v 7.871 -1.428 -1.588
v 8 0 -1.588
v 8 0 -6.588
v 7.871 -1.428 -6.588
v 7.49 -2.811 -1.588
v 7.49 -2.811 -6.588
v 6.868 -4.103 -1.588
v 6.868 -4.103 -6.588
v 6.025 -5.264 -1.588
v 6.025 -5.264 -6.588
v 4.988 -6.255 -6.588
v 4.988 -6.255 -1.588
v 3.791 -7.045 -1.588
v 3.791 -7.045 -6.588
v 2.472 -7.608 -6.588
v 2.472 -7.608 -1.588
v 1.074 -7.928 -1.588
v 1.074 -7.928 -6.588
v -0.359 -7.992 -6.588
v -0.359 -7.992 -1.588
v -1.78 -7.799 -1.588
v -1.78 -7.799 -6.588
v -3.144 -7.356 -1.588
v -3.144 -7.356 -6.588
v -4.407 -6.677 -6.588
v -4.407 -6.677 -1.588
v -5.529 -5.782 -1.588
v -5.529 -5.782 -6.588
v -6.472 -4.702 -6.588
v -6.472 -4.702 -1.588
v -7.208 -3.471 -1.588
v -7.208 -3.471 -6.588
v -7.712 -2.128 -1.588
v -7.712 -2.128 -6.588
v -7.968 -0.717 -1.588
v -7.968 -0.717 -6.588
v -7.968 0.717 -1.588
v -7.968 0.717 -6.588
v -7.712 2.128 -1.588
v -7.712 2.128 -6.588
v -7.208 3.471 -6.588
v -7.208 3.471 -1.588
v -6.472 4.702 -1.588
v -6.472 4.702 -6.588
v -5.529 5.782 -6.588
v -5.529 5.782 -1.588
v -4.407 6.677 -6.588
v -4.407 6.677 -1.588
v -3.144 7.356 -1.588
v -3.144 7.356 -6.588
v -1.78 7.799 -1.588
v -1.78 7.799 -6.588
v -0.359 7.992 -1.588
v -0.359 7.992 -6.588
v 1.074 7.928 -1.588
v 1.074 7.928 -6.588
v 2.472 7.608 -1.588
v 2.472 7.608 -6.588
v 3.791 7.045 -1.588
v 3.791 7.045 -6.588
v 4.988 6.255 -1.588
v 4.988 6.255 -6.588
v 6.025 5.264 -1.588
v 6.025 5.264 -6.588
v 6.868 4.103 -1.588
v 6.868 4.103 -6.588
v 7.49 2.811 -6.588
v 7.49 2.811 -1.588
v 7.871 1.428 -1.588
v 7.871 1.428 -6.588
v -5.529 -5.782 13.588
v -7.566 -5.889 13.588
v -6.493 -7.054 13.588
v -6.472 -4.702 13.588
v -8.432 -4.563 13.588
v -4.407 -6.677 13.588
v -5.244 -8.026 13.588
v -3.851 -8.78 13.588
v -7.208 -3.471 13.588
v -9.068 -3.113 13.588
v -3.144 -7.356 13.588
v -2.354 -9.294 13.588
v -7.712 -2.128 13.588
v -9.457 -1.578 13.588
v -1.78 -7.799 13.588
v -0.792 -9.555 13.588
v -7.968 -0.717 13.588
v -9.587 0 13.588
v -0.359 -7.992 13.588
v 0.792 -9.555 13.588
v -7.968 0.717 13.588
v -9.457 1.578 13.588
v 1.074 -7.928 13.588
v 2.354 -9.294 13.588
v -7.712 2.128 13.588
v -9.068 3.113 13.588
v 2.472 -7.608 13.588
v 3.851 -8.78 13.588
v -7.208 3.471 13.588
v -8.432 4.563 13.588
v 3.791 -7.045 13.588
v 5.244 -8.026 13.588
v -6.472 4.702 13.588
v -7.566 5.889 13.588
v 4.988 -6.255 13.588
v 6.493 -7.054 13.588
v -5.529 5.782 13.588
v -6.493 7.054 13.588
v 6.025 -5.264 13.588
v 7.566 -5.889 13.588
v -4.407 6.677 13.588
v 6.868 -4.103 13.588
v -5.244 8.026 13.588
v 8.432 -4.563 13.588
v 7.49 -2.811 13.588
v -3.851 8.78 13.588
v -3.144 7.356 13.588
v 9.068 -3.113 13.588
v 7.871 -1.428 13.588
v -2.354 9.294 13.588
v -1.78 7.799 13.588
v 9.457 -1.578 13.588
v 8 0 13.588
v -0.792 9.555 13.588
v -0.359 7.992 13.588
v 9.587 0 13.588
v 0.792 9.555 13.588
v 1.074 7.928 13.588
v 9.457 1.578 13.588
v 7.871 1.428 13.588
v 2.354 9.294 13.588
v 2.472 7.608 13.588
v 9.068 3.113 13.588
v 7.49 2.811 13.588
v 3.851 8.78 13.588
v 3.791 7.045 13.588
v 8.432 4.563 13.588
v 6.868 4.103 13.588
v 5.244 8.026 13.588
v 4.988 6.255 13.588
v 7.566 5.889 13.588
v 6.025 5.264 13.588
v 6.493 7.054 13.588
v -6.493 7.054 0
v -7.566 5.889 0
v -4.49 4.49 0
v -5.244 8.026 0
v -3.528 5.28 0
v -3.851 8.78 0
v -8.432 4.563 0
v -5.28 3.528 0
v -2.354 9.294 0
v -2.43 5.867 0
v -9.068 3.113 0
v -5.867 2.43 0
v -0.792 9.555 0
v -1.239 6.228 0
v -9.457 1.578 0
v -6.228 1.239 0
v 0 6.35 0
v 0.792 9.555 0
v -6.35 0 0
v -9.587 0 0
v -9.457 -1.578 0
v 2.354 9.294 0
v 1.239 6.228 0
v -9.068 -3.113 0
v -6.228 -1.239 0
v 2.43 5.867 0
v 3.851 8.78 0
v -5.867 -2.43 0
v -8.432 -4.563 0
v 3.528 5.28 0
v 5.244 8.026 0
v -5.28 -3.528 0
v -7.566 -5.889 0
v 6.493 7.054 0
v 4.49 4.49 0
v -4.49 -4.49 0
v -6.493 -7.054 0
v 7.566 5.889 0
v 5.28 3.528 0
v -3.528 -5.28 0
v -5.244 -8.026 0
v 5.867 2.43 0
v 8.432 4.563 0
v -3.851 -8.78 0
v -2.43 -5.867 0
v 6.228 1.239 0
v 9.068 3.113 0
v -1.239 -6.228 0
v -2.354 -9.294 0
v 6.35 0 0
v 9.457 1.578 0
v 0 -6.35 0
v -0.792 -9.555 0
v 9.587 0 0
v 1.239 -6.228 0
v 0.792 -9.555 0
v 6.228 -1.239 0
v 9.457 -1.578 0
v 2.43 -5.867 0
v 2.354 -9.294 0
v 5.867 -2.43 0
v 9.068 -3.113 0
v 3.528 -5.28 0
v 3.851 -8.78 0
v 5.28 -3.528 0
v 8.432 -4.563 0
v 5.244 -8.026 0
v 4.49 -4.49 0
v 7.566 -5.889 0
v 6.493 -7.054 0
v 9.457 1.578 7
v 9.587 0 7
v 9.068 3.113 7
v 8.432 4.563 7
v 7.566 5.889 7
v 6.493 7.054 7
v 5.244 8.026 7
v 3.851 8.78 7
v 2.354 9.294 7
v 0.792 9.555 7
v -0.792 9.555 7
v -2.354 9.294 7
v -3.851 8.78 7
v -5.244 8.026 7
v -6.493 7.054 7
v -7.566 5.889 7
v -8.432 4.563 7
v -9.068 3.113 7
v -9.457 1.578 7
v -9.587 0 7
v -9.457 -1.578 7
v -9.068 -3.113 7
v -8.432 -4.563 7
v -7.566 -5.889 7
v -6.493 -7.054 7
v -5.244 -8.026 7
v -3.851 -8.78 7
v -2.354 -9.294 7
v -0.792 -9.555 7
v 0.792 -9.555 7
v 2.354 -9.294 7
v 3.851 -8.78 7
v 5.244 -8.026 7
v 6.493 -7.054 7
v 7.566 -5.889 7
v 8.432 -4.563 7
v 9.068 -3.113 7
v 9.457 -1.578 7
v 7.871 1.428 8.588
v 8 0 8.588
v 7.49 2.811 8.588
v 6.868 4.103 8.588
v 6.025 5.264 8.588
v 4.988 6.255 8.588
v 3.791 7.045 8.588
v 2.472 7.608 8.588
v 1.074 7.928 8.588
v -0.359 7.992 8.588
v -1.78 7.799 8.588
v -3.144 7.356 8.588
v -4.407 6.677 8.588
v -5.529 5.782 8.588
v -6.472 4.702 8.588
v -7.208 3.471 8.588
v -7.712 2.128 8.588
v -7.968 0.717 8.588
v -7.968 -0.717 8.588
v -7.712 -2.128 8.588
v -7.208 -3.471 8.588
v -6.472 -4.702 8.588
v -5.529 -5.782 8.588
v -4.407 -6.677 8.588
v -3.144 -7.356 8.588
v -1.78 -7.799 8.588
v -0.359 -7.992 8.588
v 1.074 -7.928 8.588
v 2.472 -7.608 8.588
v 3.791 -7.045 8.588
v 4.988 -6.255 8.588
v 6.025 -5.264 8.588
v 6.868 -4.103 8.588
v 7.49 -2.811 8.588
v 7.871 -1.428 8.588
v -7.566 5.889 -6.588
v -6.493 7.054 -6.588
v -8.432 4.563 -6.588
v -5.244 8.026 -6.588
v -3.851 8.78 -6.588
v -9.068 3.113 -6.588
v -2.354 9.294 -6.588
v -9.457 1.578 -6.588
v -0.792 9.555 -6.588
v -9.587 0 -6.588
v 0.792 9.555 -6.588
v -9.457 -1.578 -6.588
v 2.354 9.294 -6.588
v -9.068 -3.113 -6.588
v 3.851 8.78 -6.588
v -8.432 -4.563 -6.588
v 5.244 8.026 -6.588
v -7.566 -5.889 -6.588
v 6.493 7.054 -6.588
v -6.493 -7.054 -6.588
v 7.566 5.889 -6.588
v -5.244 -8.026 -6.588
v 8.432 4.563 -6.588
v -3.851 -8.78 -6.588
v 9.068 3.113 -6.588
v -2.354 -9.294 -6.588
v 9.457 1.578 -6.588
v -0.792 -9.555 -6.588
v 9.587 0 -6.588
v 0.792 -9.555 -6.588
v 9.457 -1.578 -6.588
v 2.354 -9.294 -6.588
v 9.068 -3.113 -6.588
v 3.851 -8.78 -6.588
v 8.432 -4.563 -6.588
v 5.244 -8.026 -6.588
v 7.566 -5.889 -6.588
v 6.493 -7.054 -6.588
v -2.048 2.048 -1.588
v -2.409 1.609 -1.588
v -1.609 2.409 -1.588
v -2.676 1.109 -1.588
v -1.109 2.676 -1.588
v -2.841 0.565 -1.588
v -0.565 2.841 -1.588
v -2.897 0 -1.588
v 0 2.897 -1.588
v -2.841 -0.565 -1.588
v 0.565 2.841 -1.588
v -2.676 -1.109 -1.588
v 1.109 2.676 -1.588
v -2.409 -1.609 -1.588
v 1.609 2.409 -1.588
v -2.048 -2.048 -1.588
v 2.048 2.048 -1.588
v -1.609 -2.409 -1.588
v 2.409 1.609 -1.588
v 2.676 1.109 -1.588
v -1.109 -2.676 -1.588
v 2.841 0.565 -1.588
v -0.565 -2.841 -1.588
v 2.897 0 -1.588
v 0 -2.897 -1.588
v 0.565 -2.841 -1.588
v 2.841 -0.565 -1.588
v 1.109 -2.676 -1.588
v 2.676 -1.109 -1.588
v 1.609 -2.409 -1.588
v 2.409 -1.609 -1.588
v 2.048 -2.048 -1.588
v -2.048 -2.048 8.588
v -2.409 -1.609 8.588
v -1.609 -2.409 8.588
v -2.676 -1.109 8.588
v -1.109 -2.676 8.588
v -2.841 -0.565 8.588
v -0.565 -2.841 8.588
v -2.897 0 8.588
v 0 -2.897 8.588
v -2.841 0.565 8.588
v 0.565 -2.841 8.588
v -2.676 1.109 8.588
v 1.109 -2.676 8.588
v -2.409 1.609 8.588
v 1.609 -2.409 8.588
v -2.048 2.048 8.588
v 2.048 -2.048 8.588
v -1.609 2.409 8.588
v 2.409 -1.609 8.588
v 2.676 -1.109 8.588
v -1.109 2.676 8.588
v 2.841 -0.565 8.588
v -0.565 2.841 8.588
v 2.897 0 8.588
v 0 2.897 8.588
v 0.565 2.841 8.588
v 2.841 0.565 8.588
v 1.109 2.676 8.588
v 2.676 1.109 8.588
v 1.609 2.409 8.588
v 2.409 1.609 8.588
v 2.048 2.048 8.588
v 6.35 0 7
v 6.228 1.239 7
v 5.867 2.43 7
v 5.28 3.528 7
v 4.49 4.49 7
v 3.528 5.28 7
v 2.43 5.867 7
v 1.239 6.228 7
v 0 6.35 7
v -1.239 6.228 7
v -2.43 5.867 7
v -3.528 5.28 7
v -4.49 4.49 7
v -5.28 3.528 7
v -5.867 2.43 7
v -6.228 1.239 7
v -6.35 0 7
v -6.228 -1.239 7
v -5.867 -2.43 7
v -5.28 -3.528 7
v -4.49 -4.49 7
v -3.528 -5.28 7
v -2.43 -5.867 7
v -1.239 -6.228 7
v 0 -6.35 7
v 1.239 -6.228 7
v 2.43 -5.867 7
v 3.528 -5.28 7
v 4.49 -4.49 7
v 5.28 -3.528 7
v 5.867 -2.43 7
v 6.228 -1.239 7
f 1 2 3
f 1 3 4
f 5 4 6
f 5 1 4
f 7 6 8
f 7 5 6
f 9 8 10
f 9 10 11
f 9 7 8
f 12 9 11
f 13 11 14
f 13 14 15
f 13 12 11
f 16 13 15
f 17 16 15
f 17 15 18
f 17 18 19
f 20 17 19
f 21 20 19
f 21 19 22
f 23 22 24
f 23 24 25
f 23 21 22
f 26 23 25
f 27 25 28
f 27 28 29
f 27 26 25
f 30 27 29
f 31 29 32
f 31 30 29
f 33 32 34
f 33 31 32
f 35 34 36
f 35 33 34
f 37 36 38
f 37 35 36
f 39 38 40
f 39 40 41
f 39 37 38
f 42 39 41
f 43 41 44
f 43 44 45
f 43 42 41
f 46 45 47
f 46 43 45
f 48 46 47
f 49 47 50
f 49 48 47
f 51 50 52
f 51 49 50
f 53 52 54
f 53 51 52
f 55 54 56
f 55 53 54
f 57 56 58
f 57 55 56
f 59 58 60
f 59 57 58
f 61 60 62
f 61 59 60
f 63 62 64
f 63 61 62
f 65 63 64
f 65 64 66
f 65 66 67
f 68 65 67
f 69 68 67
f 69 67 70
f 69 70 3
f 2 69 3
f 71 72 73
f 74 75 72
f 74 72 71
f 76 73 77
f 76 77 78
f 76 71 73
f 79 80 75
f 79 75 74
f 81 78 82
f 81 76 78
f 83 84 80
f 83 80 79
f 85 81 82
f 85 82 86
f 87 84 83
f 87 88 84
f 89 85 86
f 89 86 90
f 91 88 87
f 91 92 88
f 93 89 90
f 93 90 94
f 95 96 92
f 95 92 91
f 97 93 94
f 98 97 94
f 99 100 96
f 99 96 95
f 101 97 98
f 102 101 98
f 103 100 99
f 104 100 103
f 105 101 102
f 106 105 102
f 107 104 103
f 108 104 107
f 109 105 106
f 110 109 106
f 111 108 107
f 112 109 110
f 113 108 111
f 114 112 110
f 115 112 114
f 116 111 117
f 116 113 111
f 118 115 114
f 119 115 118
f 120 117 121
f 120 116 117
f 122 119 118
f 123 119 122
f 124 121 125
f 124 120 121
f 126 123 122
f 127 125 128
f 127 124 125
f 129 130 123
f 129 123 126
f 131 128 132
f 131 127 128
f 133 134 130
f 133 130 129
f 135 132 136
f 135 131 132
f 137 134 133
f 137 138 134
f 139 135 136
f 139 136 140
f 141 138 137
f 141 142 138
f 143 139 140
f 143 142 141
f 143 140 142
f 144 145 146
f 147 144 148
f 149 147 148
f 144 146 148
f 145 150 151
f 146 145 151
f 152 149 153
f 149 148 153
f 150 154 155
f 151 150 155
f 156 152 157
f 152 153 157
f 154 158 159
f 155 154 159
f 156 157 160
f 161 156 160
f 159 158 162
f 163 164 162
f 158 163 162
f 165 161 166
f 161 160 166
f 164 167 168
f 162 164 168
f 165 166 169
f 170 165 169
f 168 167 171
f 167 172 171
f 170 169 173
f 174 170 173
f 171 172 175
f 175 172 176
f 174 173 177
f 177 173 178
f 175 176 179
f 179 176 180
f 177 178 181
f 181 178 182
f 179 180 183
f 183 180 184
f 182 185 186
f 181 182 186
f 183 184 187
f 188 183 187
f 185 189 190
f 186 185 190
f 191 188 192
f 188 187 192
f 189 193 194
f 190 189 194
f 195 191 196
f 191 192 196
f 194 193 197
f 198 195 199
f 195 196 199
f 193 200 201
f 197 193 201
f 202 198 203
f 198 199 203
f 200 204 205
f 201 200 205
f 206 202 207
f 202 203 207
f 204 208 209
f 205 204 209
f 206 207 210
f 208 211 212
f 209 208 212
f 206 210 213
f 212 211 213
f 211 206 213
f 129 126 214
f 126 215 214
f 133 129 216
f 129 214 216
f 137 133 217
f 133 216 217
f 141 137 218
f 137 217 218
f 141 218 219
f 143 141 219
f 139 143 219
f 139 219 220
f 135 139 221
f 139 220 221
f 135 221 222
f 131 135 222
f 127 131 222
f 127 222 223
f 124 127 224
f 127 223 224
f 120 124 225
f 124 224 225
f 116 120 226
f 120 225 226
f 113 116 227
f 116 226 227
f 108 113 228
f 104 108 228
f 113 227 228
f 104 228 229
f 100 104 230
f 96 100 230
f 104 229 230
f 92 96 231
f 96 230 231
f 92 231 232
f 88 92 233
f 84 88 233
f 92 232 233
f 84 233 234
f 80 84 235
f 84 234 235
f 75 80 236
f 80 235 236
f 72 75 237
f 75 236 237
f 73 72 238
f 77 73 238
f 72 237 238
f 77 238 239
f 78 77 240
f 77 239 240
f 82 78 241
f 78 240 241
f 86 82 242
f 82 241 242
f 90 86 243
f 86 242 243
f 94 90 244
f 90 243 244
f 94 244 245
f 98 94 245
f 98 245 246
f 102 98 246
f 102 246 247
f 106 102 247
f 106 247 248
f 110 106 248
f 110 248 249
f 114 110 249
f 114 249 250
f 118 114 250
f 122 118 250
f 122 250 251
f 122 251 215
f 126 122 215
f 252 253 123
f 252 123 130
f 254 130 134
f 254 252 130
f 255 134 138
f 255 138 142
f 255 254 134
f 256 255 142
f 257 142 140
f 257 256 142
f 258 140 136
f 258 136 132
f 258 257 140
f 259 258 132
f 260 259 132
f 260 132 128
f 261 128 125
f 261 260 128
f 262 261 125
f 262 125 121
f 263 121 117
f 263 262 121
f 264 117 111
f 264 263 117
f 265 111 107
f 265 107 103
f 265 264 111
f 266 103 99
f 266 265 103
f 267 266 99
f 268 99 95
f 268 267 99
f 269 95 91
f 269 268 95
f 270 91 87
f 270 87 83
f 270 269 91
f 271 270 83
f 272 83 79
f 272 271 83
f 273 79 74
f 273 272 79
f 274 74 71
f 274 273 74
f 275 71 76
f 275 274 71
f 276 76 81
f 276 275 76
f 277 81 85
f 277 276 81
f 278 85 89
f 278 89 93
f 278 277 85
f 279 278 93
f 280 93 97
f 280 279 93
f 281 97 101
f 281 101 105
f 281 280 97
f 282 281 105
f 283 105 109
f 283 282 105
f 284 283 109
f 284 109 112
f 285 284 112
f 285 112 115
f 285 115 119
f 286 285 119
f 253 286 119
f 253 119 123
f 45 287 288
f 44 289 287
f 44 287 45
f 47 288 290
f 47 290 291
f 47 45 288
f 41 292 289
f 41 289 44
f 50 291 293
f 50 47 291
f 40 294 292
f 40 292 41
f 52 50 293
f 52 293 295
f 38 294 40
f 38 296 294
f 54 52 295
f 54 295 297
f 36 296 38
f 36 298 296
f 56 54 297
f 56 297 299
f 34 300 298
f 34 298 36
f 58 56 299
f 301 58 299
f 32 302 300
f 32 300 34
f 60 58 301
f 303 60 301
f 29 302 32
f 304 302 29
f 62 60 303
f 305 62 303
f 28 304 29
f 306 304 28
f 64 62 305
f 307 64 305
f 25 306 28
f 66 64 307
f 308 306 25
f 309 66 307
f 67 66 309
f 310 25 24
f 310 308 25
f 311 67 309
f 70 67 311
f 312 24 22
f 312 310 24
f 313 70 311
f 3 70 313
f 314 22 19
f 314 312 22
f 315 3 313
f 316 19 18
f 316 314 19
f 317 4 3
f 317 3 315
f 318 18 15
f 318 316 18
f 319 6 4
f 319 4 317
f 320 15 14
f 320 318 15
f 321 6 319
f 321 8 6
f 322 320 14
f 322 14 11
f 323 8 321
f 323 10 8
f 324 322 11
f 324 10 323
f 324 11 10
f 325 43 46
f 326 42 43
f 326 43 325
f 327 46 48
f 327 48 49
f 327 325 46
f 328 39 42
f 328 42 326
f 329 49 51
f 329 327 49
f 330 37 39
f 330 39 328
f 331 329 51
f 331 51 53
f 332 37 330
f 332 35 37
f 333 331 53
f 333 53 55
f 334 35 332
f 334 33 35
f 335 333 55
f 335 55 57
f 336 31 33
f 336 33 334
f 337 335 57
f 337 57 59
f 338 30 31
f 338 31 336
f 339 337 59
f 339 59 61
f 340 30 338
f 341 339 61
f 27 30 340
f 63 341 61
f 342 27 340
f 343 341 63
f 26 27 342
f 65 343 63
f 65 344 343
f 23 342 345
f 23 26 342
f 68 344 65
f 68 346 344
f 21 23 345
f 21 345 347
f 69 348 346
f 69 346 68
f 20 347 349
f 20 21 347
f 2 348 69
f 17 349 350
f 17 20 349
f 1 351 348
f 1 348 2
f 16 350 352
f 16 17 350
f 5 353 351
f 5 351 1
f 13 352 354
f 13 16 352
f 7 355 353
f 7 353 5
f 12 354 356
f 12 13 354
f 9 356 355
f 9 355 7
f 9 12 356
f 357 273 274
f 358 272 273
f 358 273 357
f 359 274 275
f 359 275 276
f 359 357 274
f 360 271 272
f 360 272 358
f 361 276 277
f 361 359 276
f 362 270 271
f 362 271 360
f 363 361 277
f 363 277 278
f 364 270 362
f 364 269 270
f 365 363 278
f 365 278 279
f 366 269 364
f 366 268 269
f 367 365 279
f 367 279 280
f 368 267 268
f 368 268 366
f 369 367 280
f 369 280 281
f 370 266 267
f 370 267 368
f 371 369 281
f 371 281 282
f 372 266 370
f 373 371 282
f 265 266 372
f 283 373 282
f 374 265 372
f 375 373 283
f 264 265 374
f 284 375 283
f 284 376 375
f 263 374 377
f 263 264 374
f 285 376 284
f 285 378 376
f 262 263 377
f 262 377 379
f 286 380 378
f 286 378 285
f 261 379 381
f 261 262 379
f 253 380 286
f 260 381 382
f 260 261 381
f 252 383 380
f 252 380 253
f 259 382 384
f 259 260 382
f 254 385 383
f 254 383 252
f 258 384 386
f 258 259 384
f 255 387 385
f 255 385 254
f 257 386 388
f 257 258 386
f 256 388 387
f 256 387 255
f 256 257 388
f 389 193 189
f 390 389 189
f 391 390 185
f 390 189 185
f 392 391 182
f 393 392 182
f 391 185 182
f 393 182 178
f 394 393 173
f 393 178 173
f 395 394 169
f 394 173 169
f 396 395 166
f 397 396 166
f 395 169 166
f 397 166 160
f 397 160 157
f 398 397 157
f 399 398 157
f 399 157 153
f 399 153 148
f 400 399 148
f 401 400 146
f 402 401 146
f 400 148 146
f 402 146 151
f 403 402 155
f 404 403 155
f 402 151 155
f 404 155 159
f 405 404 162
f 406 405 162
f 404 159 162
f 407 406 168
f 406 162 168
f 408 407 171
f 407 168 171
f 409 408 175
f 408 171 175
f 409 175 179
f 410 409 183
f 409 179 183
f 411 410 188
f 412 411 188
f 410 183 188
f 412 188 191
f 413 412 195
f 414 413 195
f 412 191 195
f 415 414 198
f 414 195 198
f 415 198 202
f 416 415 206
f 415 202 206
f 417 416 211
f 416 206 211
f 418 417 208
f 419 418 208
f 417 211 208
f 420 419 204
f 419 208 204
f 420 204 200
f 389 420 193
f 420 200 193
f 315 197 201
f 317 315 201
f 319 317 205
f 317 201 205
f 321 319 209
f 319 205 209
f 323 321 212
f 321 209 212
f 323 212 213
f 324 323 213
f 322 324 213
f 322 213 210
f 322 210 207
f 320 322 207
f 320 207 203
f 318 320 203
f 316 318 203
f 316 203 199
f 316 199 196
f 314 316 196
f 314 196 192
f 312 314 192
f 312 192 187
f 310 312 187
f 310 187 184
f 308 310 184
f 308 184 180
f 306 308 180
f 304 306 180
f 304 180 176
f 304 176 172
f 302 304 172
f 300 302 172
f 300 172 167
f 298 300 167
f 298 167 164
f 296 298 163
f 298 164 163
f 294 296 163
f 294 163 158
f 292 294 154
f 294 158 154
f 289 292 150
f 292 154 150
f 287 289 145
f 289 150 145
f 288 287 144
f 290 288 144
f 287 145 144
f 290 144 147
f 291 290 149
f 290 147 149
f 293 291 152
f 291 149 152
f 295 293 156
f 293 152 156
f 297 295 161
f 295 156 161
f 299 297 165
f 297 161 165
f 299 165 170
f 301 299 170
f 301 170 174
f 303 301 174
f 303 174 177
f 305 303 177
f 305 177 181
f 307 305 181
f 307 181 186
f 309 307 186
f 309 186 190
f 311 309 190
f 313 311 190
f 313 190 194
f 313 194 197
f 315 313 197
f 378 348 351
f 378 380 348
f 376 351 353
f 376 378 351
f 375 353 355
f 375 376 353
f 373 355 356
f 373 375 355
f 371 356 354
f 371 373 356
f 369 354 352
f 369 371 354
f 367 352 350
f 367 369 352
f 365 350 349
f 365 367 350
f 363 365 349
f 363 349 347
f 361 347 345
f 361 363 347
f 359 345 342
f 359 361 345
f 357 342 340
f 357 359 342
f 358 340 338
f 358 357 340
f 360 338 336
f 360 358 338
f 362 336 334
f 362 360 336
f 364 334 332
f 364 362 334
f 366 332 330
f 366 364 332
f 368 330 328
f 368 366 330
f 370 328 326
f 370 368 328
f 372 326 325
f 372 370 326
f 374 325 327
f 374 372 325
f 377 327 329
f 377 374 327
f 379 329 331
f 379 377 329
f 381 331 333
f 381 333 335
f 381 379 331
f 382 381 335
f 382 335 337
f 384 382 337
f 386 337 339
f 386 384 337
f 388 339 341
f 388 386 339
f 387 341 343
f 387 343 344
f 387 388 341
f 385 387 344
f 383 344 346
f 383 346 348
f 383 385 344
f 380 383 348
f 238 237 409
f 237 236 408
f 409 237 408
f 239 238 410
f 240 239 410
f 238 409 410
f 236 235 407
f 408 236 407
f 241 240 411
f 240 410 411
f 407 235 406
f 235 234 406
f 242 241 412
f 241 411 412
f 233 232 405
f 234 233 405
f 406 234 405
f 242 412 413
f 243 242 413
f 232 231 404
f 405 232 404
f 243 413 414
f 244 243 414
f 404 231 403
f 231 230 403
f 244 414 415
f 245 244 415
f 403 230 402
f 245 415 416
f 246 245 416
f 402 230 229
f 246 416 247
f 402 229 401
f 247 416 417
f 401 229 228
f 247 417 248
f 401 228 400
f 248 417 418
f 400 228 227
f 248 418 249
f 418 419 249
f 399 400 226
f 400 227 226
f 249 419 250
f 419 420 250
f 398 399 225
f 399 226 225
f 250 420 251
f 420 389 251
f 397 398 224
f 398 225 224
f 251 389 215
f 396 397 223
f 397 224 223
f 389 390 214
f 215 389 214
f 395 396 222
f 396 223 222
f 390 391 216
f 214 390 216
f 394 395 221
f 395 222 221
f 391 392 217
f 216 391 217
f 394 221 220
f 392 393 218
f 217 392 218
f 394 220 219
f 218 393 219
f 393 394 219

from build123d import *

# Parameters (mm, degrees)
F0_R     = 6.35
F0_R_2   = 2.89687
F1_DEPTH = 7
F2_R     = 9.587497
F2_R_2   = 2.89687
F3_DEPTH = 1.5875
F4_R     = 9.587497
F4_R_2   = 8
F5_DEPTH = 5
F6_R     = 9.587497
F6_R_2   = 2.89687
F7_DEPTH = 1.5875
F8_R     = 9.587497
F8_R_2   = 8
F9_DEPTH = 5


with BuildPart() as f1:
    # F0 (on Top) → F1 (new body)
    with BuildSketch(Plane.XY):
        Circle(F0_R)
        Circle(F0_R_2, mode=Mode.SUBTRACT)
    extrude(amount=F1_DEPTH)

    # F2 (on face) → F3 (join)
    with BuildSketch(Plane.XY.offset(7)):
        Circle(F2_R)
        Circle(F2_R_2, mode=Mode.SUBTRACT)
    extrude(amount=F3_DEPTH)



with BuildPart() as f5:
    # F4 (on face) → F5 (new body)
    with BuildSketch(Plane(origin=(0, 0, -1.5875), x_dir=(1, 0, 0), z_dir=(0, 0, -1))):
        Circle(F4_R)
        Circle(F4_R_2, mode=Mode.SUBTRACT)
    extrude(amount=F5_DEPTH)


with BuildPart() as f1_1:
    add(f1.part)

    add(f5.part)  # F7 merges F5
    # F6 (on face) → F7 (join)
    with BuildSketch(Plane(origin=(0, 0, 0), x_dir=(1, 0, 0), z_dir=(0, 0, -1))):
        Circle(F6_R)
        Circle(F6_R_2, mode=Mode.SUBTRACT)
    extrude(amount=F7_DEPTH)

    # F8 (on face) → F9 (join)
    with BuildSketch(Plane.XY.offset(8.5875)):
        Circle(F8_R)
        Circle(F8_R_2, mode=Mode.SUBTRACT)
    extrude(amount=F9_DEPTH)


solid = f1_1.part
